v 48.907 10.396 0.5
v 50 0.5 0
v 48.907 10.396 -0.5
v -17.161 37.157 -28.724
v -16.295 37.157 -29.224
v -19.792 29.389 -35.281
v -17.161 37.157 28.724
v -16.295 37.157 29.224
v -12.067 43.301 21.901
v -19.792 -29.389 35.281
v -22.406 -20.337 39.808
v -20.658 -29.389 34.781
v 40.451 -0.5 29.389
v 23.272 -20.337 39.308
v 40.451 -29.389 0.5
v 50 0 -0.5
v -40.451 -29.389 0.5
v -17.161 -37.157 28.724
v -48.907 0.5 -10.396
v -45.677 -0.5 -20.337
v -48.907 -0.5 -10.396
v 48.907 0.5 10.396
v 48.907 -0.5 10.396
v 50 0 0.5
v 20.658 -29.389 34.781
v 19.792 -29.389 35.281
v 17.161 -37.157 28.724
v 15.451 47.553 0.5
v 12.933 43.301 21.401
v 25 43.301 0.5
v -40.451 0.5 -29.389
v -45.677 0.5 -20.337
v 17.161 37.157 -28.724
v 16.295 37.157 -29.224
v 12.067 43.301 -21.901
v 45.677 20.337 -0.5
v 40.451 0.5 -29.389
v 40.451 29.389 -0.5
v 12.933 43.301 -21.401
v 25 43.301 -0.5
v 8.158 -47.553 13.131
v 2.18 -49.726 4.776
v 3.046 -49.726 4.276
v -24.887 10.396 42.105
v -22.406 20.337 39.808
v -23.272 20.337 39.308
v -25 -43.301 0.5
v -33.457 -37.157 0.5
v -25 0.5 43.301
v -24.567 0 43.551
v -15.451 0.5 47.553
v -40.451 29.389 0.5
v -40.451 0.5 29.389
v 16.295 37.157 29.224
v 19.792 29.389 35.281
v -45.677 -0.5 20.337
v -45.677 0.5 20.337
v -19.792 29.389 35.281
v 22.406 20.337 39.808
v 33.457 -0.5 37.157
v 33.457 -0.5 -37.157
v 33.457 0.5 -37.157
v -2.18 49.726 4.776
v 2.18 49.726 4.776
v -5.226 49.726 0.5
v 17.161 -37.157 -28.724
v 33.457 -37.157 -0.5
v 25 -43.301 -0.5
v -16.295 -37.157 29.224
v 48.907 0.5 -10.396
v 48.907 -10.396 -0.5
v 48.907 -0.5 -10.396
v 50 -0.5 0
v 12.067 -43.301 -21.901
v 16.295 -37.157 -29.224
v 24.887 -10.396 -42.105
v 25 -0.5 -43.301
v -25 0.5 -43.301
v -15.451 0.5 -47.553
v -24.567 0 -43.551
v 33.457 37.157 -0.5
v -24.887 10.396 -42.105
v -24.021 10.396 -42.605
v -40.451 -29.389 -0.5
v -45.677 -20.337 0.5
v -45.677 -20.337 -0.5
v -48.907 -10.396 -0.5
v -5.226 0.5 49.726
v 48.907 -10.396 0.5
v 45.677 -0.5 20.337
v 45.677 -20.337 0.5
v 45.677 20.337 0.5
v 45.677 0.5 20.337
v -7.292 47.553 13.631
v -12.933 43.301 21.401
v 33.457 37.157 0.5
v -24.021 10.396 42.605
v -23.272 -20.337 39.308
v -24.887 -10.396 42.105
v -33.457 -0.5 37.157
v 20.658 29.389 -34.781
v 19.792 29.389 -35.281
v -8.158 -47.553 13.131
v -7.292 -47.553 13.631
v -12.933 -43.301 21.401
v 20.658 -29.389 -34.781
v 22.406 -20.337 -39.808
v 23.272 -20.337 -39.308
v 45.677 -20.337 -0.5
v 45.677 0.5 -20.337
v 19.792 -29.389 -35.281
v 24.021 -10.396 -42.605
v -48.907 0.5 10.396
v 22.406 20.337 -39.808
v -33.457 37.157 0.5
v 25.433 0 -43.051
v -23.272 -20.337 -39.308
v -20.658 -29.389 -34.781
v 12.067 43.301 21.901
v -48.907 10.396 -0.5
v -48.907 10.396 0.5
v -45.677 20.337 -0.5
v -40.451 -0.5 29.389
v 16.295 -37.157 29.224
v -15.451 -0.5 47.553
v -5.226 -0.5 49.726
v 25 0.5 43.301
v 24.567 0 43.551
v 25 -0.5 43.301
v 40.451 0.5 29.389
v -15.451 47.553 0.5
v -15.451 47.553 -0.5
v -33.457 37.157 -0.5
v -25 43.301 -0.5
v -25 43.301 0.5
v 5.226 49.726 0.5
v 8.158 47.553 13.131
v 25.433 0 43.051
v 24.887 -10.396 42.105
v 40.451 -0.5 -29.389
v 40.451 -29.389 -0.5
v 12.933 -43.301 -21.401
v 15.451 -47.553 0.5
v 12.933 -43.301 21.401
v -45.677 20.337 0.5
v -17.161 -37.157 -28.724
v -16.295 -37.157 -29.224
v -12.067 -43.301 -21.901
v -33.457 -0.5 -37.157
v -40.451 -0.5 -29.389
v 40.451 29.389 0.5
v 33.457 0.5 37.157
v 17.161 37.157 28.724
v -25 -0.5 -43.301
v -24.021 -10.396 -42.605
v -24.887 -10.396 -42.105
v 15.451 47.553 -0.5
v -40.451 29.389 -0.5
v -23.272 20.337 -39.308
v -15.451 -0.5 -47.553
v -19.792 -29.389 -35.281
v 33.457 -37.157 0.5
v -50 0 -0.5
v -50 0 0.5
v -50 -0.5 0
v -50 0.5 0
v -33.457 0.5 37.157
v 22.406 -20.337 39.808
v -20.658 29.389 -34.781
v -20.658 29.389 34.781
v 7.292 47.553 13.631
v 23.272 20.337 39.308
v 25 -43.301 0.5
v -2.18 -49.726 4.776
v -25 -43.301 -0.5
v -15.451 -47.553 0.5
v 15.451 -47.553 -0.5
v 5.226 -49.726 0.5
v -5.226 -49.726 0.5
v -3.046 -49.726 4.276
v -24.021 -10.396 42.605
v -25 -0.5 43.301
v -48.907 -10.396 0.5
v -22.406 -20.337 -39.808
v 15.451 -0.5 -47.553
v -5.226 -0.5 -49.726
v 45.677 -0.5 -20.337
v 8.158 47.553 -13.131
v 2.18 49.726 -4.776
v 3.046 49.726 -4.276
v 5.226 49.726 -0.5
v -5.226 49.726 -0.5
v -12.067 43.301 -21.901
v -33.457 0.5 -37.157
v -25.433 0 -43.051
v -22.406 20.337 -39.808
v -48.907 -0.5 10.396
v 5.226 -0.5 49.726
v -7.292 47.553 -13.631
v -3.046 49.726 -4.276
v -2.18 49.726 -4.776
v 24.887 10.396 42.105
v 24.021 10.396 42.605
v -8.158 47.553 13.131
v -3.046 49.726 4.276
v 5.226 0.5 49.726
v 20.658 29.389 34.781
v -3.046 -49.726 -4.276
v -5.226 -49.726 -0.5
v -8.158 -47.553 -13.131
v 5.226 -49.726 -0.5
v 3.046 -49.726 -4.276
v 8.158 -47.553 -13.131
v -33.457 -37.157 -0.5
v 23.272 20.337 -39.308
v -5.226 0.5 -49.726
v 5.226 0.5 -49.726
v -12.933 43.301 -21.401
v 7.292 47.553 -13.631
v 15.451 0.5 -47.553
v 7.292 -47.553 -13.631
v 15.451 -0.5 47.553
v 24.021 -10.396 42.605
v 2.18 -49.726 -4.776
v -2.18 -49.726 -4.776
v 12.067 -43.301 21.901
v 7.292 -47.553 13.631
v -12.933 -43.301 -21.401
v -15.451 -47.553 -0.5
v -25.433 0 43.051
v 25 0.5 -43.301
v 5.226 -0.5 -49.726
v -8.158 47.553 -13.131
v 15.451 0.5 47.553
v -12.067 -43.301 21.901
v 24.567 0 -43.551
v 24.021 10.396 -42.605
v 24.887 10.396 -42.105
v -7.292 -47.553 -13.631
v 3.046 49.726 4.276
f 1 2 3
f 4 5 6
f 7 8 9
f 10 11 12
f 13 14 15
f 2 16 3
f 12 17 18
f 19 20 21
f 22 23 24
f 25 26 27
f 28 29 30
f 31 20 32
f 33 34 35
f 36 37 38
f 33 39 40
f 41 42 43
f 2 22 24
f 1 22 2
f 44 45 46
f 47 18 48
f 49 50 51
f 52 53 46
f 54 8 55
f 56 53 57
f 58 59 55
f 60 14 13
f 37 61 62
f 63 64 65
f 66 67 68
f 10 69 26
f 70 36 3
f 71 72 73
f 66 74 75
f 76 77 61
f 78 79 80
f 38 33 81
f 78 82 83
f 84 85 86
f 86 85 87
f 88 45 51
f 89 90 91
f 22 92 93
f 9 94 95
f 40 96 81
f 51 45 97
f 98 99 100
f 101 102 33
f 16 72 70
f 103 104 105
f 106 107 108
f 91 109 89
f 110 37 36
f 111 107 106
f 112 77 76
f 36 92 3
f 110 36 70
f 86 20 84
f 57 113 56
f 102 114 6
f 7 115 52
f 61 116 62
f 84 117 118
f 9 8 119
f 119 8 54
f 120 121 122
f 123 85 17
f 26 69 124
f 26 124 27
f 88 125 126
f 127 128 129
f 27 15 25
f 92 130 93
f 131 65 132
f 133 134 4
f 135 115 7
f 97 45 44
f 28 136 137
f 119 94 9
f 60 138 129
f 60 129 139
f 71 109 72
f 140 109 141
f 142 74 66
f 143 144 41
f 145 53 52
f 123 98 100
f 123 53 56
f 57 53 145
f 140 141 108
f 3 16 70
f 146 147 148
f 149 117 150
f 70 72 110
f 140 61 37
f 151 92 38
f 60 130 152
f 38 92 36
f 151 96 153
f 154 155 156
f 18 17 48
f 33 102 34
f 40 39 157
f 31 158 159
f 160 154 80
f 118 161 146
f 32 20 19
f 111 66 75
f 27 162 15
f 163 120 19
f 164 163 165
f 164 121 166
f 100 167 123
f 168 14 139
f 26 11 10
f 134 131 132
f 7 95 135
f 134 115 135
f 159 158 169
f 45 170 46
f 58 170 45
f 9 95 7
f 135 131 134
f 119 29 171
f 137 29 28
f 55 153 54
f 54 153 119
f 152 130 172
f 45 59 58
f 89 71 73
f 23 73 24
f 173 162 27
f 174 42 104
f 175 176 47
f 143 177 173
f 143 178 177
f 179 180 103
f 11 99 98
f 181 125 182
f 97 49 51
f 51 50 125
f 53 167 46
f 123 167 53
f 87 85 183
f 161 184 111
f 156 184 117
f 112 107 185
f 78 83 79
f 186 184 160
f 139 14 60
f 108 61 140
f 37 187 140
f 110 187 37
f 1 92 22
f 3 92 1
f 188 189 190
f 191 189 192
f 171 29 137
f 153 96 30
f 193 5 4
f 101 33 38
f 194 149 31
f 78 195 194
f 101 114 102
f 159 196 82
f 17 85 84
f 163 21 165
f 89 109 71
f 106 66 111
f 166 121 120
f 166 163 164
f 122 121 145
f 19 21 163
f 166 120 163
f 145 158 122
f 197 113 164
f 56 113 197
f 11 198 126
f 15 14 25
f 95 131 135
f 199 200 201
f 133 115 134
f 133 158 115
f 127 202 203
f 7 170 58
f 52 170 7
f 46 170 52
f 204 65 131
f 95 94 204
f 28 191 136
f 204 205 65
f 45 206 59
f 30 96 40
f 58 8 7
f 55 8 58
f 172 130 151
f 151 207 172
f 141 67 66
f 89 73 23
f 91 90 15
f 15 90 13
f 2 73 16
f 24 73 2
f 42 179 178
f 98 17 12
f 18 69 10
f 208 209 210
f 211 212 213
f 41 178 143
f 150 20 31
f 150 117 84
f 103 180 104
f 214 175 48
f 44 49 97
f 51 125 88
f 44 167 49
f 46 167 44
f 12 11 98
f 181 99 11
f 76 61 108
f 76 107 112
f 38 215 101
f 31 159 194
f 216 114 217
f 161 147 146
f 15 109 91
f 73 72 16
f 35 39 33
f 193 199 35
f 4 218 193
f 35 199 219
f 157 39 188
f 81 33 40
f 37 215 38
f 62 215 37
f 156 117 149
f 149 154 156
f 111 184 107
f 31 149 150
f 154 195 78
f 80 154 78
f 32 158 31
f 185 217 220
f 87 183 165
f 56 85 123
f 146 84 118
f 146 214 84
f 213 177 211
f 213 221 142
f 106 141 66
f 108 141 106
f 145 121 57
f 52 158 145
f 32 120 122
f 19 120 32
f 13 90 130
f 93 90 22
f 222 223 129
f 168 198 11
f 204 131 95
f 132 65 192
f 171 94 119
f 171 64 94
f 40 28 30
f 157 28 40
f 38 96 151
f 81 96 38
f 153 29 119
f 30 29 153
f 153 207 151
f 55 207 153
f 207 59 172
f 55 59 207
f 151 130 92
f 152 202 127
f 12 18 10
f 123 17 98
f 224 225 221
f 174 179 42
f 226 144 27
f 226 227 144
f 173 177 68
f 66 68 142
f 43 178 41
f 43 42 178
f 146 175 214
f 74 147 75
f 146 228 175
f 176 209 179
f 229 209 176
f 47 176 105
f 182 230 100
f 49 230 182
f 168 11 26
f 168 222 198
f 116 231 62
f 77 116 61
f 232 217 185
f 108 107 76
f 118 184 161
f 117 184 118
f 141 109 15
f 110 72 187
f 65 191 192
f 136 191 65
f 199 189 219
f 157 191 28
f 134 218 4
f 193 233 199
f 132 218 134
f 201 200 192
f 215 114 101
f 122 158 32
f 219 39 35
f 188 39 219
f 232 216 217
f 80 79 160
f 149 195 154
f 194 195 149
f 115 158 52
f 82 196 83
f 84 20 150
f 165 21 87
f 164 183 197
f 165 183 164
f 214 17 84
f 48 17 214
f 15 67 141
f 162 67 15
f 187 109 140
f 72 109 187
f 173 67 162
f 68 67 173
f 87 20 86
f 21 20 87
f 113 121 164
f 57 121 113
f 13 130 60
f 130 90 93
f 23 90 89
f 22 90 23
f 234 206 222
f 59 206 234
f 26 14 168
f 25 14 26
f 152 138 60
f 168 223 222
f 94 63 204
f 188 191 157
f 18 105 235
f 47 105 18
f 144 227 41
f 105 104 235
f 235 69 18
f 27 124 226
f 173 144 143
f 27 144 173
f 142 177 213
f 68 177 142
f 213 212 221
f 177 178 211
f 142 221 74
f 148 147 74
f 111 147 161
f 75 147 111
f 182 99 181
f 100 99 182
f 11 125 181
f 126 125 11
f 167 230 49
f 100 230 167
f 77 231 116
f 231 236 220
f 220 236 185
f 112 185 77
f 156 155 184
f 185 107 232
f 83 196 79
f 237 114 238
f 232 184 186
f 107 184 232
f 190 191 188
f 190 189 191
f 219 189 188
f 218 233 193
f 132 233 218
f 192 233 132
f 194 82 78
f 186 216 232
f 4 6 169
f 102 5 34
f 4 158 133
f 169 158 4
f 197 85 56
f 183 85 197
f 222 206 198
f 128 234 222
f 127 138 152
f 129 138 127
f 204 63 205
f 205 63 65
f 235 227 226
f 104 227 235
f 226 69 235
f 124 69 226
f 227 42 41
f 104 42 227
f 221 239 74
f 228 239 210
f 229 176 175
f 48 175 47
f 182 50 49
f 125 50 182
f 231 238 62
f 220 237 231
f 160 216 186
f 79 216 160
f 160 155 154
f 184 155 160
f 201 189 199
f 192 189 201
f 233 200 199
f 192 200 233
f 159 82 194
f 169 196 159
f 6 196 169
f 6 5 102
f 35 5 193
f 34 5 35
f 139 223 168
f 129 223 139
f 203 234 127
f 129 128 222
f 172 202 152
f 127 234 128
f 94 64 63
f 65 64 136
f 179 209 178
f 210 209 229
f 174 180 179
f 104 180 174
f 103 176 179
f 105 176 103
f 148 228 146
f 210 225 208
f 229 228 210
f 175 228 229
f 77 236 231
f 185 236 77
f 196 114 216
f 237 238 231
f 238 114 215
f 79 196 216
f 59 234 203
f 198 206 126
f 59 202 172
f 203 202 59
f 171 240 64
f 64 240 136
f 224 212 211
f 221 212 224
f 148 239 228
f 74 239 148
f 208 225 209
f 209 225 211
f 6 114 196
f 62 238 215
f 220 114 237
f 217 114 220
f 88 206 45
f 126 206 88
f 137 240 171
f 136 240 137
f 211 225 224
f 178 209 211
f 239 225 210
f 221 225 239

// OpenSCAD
 /*
  * Copyright [2017] [Saul Castro]

    Licensed under the Apache License, Version 2.0 (the "License");
    you may not use this file except in compliance with the License.
    You may obtain a copy of the License at
    
        http://www.apache.org/licenses/LICENSE-2.0
    
    Unless required by applicable law or agreed to in writing, software
    distributed under the License is distributed on an "AS IS" BASIS,
    WITHOUT WARRANTIES OR CONDITIONS OF ANY KIND, either express or implied.
    See the License for the specific language governing permissions and
    limitations under the License.

  */
  
  
/*==================================================
==================	Extention of basic shape with shot sintax =====================
==================================================*/
//all shapes centered at 0, 0 for easy rotation

// r prefix rounded
// rrc(10, 20 ,30, 4, 5);

fn = 50;


sp(100, fn);

module c(w, l, d){
    translate([0,0,0]) cube([w, l, d], center=true);
}

module cy(d, h){  
    translate([0,0,0])    cylinder(d=d, h=h, $fn=fn, center=true);
}
module cy(d, h, f){  
    translate([0,0,0])    cylinder(d=d, h=h, $fn=f, center=true);
}

module sp(d, f){  
    hull(){
    translate([0,0,0])    cy(d, 1);
        for(i=[0 :2]) 
    rotate([0,120*i,0])    cy(d, 1);
//    rotate([0,90,0])    cy(d, 1);
    rotate([90,0,0])    cy(d, 1); 
//    translate([0,0,0])    cy(1, d);
    }
} 

module rcy(d, h, c, fn){
	minkowski(){
			sp(c);
			cy(d-c, h-c, fn);
        }
}

module rc(w, l, d, c){
    hull(){
            translate([w/2-c/2,l/2-c/2,0]) cy(c, d);
            translate([w/2-c/2,-l/2+c/2,0]) cy(c, d);
            translate([-(w/2-c/2),l/2-c/2,0]) cy(c, d);
            translate([-(w/2-c/2),-l/2+c/2,0]) cy(c, d);
    }
    
}

module rrc(w, h, d, c, s){
          translate([0,0,0])  minkowski(){
			sp(s);
			rc(w-s, h-s, d-s, c);
        }
}



module slot(d, l, h){
    hull(){
         translate([0,l/2-d/2,0]) cy(d, h);
            translate([0,-l/2+d/2,0]) cy(d, h);
    }
    
}
